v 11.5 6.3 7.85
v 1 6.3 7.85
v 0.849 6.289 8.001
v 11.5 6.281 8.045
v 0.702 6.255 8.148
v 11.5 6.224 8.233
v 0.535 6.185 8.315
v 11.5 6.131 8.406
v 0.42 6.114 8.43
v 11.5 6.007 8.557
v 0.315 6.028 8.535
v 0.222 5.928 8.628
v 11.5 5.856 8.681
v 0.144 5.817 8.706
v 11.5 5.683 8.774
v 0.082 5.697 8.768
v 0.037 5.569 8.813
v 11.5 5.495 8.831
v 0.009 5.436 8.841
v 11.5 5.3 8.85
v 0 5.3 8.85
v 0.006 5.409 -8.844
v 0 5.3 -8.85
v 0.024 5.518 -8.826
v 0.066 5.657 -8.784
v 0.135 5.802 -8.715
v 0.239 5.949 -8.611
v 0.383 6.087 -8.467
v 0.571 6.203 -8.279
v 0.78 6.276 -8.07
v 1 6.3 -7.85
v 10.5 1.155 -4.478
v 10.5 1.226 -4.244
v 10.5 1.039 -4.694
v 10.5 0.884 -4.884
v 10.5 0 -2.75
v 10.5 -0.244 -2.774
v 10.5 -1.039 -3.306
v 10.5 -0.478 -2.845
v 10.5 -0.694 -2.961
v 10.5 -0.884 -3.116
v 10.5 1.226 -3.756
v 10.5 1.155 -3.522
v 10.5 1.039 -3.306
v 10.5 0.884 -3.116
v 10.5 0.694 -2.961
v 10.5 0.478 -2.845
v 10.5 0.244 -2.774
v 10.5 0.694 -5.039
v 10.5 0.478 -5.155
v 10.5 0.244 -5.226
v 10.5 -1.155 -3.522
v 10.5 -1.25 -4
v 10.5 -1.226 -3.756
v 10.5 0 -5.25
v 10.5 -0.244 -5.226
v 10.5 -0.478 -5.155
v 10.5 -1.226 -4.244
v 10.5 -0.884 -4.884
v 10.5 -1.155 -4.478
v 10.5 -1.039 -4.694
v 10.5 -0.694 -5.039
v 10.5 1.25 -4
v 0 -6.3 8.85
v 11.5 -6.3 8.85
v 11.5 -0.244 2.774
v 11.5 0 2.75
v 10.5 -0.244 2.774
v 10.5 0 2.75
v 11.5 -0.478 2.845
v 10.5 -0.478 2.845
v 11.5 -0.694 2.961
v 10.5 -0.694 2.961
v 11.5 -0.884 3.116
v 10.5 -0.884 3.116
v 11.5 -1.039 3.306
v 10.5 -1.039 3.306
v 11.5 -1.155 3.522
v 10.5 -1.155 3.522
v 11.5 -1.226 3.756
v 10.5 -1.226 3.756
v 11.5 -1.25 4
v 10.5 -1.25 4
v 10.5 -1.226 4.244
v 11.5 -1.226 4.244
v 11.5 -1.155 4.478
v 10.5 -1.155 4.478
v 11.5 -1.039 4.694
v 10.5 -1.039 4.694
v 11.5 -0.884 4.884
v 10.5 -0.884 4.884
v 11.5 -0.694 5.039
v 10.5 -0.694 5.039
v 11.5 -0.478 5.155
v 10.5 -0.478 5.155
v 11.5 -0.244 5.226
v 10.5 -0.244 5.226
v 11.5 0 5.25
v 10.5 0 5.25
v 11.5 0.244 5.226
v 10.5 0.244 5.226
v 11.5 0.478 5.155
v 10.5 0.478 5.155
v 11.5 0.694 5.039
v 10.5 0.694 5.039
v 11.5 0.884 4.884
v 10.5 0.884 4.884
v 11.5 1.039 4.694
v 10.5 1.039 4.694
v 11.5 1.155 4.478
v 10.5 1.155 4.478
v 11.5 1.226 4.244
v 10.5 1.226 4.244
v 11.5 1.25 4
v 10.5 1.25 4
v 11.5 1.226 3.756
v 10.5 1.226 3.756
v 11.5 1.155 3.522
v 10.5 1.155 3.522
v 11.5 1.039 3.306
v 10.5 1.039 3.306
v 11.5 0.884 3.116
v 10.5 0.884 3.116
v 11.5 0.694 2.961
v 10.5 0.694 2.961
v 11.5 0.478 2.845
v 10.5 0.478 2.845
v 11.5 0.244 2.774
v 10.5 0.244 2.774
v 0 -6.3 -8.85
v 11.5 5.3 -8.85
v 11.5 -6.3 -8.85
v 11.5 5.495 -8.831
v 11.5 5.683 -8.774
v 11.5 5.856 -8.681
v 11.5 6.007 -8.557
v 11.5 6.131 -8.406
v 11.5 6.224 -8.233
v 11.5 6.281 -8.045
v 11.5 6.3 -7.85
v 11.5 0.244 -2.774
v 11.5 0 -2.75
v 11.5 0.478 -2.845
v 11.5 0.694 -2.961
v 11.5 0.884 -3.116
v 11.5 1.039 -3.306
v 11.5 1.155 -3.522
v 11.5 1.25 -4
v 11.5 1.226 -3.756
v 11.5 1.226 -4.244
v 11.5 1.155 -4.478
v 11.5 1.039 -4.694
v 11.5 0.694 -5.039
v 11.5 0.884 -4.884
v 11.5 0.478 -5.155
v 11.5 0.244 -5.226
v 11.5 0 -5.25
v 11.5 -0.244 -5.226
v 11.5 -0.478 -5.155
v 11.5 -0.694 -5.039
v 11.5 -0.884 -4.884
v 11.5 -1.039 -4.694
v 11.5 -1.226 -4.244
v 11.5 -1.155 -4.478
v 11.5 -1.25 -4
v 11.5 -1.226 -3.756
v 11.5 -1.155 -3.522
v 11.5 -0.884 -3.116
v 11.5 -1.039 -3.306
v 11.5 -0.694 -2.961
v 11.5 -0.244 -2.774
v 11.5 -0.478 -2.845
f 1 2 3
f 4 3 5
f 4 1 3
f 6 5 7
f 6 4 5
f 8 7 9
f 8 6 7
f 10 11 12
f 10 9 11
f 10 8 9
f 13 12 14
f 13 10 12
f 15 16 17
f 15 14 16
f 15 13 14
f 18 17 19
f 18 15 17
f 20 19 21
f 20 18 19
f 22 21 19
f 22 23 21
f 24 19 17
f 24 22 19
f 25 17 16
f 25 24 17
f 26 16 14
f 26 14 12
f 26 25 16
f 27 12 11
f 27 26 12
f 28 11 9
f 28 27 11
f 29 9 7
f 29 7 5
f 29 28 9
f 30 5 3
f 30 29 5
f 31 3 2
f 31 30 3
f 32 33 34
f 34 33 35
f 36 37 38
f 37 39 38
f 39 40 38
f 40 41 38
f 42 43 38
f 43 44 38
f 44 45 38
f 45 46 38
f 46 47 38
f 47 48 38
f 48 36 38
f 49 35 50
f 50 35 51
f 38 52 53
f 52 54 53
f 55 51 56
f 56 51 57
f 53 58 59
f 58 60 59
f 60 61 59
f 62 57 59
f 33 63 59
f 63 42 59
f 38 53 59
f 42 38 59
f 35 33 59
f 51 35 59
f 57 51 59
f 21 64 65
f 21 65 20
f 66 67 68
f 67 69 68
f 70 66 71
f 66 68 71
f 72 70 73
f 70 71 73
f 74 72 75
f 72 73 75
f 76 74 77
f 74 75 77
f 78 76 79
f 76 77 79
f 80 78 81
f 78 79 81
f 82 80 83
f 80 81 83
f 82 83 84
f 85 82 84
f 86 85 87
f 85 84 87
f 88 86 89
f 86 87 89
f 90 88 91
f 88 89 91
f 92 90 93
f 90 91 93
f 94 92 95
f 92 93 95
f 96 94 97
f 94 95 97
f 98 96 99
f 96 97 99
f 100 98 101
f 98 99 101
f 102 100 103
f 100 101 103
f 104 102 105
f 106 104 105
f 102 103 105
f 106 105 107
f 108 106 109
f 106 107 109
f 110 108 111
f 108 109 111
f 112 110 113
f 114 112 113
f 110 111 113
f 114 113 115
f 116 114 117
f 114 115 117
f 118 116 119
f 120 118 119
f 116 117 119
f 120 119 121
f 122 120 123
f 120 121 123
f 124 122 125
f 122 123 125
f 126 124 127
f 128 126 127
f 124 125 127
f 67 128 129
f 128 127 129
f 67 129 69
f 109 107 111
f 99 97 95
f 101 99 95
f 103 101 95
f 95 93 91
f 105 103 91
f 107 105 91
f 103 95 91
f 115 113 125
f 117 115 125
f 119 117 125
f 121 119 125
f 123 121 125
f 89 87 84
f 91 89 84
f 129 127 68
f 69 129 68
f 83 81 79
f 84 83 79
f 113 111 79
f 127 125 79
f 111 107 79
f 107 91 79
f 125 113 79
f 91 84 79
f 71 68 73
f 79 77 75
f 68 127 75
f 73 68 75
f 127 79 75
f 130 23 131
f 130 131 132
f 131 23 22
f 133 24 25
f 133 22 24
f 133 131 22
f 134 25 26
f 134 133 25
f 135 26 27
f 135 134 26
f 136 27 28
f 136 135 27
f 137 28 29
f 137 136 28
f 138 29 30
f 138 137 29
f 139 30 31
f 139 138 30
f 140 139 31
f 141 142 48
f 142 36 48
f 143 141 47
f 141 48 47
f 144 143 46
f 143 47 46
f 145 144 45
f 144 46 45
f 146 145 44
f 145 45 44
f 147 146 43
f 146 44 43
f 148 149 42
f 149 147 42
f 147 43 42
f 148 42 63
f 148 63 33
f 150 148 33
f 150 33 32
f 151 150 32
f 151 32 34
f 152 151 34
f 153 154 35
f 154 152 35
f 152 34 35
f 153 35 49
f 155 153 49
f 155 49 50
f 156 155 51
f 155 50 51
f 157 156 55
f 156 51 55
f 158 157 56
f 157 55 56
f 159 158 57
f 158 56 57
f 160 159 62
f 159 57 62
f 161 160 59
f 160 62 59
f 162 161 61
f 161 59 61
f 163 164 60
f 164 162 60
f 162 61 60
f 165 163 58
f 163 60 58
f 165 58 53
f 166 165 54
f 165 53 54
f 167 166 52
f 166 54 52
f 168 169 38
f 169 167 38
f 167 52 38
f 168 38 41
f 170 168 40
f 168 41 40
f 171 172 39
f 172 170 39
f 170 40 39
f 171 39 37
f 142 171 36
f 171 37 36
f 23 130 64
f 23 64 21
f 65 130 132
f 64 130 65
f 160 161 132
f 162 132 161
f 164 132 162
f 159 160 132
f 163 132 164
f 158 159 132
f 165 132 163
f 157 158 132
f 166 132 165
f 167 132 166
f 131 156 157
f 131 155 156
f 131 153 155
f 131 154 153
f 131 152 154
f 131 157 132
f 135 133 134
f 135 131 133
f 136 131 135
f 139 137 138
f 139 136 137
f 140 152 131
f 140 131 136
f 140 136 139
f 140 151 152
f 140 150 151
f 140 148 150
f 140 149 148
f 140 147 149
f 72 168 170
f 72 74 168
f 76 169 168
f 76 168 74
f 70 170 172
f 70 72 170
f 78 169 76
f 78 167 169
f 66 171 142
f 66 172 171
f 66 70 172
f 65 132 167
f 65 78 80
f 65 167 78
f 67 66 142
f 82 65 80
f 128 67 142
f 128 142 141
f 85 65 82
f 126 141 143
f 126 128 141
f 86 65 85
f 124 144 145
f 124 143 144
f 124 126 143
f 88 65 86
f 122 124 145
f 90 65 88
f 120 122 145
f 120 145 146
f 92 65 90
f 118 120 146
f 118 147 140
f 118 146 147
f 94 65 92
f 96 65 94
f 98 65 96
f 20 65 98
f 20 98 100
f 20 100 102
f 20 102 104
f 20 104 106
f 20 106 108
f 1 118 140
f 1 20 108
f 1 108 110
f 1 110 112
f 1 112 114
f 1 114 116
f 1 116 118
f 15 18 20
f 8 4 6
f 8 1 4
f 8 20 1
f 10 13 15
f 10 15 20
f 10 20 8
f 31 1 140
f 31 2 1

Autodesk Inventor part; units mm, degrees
ref_plane "YZ Plane" through (0, 0, 0) normal (1, 0, 0) x (0, 1, 0)
ref_plane "XZ Plane" through (0, 0, 0) normal (0, 1, 0) x (-1, 0, 0)
sketch "Sketch2" plane through (0, 0, 0) normal (1, 0, 0) x (0, 1, 0)
  line L0 (-6.3, 8.85) -> (6.3, 8.85)
  line L1 (6.3, 8.85) -> (6.3, -8.85)
  line L2 (6.3, -8.85) -> (-6.3, -8.85)
  line L3 (-6.3, -8.85) -> (-6.3, 8.85)
  line L4 (-6.3, 8.85) -> (6.3, -8.85) construction
  line L5 (6.3, 8.85) -> (-6.3, -8.85) construction
  point P0 (0, 0)
  dimension "d0" = 17.7
  dimension "d1" = 12.6
extrude "Extrusion1" add sketch "Sketch2" along normal blind 11.5
fillet "Fillet1" radius 1 3 edges at (5.75, 6.3, 8.85) (5.75, 6.3, -8.85) (0, 6.3, 0)
ref_plane "Work Plane1" through (0, -6.3, 0) normal (0, 0, 1) x (1, 0, 0)
sketch "Sketch3" plane through (11.5, 0, 0) normal (1, 0, 0) x (0, 0, -1)
  circle A0 centre (-4, 0) radius 1.25
  point P0 (0, 0)
  dimension "d5" = 2.5
  dimension "d6" = 4
hole "Hole1" at (11.5, 0, 4) direction (-1, 0, 0) diameter 2.5 depth 1
mirror "Mirror1" about plane through (0, -6.3, 0) normal (0, 0, 1) of "Hole1"
properties part number "IR sensor" material "ABS Plastic"
